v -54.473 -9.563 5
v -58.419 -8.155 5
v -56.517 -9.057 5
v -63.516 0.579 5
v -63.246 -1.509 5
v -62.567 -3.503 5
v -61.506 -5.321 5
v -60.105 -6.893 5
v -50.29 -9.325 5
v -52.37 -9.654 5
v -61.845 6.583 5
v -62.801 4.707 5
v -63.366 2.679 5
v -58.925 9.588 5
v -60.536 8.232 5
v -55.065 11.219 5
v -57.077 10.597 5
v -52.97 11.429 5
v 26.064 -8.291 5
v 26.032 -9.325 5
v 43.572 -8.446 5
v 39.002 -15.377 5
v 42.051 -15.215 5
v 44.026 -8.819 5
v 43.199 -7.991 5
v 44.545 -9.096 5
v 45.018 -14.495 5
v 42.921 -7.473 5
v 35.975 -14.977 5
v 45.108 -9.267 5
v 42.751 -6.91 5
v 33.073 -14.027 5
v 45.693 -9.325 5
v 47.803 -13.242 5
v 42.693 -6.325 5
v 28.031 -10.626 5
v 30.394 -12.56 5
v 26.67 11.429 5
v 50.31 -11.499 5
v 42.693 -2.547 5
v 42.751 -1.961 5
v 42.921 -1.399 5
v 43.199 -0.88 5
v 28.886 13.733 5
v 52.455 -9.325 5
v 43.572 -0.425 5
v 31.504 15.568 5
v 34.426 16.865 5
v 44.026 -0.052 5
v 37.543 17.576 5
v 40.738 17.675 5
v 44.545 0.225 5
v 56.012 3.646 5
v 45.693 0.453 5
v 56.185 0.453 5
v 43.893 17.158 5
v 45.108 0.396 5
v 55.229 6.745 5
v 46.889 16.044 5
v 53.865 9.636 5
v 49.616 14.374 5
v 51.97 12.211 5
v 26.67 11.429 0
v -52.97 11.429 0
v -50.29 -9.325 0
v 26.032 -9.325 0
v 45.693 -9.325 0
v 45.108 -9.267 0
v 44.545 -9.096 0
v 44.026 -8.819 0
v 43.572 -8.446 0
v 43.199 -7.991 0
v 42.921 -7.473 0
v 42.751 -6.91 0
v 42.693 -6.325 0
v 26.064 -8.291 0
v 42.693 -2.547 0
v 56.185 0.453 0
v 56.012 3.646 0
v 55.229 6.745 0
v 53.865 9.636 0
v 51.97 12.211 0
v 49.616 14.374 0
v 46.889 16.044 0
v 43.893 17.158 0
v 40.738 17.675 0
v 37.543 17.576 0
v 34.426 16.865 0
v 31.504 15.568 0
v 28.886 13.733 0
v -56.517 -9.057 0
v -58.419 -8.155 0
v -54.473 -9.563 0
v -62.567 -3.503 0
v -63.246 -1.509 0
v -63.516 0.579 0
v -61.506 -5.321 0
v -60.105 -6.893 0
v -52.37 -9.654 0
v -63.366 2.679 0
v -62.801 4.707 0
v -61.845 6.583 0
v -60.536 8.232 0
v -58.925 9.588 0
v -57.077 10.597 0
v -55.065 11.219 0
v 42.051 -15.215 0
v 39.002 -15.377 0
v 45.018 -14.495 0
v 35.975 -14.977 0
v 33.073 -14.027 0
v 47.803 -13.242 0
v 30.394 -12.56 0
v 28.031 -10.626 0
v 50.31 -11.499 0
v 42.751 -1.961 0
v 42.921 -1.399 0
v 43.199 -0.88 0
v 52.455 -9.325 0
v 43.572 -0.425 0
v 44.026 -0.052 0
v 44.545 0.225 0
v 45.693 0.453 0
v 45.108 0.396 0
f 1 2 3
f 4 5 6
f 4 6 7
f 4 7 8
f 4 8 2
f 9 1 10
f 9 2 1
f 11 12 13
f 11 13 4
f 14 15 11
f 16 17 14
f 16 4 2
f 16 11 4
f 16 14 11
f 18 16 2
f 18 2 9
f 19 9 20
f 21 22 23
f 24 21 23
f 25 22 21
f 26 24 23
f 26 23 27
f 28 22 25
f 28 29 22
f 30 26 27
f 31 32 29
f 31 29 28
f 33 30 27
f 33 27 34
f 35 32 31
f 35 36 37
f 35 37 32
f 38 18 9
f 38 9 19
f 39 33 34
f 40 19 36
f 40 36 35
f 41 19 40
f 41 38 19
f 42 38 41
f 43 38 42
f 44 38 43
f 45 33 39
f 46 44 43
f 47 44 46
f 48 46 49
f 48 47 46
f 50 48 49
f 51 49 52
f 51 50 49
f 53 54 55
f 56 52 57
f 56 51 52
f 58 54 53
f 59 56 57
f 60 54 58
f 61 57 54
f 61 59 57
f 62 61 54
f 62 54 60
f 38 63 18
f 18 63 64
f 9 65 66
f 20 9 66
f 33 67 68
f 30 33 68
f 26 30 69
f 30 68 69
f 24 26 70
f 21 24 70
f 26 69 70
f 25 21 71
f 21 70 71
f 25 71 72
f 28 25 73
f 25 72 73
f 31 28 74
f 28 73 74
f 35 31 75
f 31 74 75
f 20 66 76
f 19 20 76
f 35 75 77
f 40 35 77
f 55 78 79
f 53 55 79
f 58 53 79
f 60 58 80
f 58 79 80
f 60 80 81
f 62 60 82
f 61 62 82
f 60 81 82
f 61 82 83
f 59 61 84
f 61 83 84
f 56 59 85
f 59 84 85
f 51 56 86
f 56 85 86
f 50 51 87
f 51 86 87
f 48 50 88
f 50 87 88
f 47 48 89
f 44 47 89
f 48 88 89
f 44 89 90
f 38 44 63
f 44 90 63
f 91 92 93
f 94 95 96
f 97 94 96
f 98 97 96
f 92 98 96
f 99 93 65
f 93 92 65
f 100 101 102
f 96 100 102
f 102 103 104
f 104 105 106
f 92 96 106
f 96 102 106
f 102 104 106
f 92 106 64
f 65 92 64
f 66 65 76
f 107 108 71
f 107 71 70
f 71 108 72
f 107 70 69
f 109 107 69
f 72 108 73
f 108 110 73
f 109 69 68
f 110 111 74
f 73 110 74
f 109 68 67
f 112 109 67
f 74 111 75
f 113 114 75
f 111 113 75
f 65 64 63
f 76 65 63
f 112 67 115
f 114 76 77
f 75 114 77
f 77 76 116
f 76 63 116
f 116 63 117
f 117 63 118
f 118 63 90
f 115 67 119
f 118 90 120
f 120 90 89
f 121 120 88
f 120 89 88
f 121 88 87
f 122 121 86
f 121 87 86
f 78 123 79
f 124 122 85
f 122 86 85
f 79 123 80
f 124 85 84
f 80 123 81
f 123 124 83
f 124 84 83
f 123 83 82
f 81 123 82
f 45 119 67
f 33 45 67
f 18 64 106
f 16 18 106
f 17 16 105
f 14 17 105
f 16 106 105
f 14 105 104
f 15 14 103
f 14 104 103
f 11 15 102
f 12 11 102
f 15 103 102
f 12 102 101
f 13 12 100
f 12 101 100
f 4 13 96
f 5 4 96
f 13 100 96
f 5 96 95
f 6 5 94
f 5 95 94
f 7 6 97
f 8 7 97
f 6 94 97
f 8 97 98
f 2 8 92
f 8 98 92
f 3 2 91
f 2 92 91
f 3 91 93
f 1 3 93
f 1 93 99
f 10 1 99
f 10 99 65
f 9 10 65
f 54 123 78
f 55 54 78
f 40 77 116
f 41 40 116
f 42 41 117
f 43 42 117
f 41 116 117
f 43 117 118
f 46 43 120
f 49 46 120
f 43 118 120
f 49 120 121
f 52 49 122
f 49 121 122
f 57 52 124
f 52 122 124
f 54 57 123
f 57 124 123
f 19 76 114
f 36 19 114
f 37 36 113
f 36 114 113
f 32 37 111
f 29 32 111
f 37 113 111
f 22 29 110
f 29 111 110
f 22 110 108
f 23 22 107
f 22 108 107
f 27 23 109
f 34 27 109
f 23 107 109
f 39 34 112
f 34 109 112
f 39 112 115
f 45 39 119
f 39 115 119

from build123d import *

# Parameters (mm, degrees)
F1_DEPTH = 5


with BuildPart() as f1:
    # F0 (on Top) → F1 (new body)
    with BuildSketch(Plane.XY):
        with BuildLine():
            Line((26.669694, 11.429262), (-52.970227, 11.429262))
            ThreePointArc((-52.970227, 11.429262), (-63.433421, -0.472084), (-50.289965, -9.324771))
            Line((-50.289965, -9.324771), (26.031774, -9.324771))
            Line((26.031774, -9.324771), (26.063537, -8.29138))
            ThreePointArc((26.063537, -8.29138), (23.106773, 1.66914), (26.669694, 11.429262))
        make_face()
        with BuildLine():
            ThreePointArc((56.184654, 0.453414), (45.418068, 16.673179), (26.669694, 11.429262))
            ThreePointArc((26.669694, 11.429262), (23.106773, 1.66914), (26.063537, -8.29138))
            ThreePointArc((26.063537, -8.29138), (39.001798, -15.377065), (52.454503, -9.324771))
            Line((52.454503, -9.324771), (45.693033, -9.324771))
            ThreePointArc((45.693033, -9.324771), (43.571713, -8.446092), (42.693033, -6.324771))
            Line((42.693033, -6.324771), (42.693033, -2.546586))
            ThreePointArc((42.693033, -2.546586), (43.571713, -0.425266), (45.693033, 0.453414))
            Line((45.693033, 0.453414), (56.184654, 0.453414))
        make_face()
    extrude(amount=F1_DEPTH)


solid = f1.part
